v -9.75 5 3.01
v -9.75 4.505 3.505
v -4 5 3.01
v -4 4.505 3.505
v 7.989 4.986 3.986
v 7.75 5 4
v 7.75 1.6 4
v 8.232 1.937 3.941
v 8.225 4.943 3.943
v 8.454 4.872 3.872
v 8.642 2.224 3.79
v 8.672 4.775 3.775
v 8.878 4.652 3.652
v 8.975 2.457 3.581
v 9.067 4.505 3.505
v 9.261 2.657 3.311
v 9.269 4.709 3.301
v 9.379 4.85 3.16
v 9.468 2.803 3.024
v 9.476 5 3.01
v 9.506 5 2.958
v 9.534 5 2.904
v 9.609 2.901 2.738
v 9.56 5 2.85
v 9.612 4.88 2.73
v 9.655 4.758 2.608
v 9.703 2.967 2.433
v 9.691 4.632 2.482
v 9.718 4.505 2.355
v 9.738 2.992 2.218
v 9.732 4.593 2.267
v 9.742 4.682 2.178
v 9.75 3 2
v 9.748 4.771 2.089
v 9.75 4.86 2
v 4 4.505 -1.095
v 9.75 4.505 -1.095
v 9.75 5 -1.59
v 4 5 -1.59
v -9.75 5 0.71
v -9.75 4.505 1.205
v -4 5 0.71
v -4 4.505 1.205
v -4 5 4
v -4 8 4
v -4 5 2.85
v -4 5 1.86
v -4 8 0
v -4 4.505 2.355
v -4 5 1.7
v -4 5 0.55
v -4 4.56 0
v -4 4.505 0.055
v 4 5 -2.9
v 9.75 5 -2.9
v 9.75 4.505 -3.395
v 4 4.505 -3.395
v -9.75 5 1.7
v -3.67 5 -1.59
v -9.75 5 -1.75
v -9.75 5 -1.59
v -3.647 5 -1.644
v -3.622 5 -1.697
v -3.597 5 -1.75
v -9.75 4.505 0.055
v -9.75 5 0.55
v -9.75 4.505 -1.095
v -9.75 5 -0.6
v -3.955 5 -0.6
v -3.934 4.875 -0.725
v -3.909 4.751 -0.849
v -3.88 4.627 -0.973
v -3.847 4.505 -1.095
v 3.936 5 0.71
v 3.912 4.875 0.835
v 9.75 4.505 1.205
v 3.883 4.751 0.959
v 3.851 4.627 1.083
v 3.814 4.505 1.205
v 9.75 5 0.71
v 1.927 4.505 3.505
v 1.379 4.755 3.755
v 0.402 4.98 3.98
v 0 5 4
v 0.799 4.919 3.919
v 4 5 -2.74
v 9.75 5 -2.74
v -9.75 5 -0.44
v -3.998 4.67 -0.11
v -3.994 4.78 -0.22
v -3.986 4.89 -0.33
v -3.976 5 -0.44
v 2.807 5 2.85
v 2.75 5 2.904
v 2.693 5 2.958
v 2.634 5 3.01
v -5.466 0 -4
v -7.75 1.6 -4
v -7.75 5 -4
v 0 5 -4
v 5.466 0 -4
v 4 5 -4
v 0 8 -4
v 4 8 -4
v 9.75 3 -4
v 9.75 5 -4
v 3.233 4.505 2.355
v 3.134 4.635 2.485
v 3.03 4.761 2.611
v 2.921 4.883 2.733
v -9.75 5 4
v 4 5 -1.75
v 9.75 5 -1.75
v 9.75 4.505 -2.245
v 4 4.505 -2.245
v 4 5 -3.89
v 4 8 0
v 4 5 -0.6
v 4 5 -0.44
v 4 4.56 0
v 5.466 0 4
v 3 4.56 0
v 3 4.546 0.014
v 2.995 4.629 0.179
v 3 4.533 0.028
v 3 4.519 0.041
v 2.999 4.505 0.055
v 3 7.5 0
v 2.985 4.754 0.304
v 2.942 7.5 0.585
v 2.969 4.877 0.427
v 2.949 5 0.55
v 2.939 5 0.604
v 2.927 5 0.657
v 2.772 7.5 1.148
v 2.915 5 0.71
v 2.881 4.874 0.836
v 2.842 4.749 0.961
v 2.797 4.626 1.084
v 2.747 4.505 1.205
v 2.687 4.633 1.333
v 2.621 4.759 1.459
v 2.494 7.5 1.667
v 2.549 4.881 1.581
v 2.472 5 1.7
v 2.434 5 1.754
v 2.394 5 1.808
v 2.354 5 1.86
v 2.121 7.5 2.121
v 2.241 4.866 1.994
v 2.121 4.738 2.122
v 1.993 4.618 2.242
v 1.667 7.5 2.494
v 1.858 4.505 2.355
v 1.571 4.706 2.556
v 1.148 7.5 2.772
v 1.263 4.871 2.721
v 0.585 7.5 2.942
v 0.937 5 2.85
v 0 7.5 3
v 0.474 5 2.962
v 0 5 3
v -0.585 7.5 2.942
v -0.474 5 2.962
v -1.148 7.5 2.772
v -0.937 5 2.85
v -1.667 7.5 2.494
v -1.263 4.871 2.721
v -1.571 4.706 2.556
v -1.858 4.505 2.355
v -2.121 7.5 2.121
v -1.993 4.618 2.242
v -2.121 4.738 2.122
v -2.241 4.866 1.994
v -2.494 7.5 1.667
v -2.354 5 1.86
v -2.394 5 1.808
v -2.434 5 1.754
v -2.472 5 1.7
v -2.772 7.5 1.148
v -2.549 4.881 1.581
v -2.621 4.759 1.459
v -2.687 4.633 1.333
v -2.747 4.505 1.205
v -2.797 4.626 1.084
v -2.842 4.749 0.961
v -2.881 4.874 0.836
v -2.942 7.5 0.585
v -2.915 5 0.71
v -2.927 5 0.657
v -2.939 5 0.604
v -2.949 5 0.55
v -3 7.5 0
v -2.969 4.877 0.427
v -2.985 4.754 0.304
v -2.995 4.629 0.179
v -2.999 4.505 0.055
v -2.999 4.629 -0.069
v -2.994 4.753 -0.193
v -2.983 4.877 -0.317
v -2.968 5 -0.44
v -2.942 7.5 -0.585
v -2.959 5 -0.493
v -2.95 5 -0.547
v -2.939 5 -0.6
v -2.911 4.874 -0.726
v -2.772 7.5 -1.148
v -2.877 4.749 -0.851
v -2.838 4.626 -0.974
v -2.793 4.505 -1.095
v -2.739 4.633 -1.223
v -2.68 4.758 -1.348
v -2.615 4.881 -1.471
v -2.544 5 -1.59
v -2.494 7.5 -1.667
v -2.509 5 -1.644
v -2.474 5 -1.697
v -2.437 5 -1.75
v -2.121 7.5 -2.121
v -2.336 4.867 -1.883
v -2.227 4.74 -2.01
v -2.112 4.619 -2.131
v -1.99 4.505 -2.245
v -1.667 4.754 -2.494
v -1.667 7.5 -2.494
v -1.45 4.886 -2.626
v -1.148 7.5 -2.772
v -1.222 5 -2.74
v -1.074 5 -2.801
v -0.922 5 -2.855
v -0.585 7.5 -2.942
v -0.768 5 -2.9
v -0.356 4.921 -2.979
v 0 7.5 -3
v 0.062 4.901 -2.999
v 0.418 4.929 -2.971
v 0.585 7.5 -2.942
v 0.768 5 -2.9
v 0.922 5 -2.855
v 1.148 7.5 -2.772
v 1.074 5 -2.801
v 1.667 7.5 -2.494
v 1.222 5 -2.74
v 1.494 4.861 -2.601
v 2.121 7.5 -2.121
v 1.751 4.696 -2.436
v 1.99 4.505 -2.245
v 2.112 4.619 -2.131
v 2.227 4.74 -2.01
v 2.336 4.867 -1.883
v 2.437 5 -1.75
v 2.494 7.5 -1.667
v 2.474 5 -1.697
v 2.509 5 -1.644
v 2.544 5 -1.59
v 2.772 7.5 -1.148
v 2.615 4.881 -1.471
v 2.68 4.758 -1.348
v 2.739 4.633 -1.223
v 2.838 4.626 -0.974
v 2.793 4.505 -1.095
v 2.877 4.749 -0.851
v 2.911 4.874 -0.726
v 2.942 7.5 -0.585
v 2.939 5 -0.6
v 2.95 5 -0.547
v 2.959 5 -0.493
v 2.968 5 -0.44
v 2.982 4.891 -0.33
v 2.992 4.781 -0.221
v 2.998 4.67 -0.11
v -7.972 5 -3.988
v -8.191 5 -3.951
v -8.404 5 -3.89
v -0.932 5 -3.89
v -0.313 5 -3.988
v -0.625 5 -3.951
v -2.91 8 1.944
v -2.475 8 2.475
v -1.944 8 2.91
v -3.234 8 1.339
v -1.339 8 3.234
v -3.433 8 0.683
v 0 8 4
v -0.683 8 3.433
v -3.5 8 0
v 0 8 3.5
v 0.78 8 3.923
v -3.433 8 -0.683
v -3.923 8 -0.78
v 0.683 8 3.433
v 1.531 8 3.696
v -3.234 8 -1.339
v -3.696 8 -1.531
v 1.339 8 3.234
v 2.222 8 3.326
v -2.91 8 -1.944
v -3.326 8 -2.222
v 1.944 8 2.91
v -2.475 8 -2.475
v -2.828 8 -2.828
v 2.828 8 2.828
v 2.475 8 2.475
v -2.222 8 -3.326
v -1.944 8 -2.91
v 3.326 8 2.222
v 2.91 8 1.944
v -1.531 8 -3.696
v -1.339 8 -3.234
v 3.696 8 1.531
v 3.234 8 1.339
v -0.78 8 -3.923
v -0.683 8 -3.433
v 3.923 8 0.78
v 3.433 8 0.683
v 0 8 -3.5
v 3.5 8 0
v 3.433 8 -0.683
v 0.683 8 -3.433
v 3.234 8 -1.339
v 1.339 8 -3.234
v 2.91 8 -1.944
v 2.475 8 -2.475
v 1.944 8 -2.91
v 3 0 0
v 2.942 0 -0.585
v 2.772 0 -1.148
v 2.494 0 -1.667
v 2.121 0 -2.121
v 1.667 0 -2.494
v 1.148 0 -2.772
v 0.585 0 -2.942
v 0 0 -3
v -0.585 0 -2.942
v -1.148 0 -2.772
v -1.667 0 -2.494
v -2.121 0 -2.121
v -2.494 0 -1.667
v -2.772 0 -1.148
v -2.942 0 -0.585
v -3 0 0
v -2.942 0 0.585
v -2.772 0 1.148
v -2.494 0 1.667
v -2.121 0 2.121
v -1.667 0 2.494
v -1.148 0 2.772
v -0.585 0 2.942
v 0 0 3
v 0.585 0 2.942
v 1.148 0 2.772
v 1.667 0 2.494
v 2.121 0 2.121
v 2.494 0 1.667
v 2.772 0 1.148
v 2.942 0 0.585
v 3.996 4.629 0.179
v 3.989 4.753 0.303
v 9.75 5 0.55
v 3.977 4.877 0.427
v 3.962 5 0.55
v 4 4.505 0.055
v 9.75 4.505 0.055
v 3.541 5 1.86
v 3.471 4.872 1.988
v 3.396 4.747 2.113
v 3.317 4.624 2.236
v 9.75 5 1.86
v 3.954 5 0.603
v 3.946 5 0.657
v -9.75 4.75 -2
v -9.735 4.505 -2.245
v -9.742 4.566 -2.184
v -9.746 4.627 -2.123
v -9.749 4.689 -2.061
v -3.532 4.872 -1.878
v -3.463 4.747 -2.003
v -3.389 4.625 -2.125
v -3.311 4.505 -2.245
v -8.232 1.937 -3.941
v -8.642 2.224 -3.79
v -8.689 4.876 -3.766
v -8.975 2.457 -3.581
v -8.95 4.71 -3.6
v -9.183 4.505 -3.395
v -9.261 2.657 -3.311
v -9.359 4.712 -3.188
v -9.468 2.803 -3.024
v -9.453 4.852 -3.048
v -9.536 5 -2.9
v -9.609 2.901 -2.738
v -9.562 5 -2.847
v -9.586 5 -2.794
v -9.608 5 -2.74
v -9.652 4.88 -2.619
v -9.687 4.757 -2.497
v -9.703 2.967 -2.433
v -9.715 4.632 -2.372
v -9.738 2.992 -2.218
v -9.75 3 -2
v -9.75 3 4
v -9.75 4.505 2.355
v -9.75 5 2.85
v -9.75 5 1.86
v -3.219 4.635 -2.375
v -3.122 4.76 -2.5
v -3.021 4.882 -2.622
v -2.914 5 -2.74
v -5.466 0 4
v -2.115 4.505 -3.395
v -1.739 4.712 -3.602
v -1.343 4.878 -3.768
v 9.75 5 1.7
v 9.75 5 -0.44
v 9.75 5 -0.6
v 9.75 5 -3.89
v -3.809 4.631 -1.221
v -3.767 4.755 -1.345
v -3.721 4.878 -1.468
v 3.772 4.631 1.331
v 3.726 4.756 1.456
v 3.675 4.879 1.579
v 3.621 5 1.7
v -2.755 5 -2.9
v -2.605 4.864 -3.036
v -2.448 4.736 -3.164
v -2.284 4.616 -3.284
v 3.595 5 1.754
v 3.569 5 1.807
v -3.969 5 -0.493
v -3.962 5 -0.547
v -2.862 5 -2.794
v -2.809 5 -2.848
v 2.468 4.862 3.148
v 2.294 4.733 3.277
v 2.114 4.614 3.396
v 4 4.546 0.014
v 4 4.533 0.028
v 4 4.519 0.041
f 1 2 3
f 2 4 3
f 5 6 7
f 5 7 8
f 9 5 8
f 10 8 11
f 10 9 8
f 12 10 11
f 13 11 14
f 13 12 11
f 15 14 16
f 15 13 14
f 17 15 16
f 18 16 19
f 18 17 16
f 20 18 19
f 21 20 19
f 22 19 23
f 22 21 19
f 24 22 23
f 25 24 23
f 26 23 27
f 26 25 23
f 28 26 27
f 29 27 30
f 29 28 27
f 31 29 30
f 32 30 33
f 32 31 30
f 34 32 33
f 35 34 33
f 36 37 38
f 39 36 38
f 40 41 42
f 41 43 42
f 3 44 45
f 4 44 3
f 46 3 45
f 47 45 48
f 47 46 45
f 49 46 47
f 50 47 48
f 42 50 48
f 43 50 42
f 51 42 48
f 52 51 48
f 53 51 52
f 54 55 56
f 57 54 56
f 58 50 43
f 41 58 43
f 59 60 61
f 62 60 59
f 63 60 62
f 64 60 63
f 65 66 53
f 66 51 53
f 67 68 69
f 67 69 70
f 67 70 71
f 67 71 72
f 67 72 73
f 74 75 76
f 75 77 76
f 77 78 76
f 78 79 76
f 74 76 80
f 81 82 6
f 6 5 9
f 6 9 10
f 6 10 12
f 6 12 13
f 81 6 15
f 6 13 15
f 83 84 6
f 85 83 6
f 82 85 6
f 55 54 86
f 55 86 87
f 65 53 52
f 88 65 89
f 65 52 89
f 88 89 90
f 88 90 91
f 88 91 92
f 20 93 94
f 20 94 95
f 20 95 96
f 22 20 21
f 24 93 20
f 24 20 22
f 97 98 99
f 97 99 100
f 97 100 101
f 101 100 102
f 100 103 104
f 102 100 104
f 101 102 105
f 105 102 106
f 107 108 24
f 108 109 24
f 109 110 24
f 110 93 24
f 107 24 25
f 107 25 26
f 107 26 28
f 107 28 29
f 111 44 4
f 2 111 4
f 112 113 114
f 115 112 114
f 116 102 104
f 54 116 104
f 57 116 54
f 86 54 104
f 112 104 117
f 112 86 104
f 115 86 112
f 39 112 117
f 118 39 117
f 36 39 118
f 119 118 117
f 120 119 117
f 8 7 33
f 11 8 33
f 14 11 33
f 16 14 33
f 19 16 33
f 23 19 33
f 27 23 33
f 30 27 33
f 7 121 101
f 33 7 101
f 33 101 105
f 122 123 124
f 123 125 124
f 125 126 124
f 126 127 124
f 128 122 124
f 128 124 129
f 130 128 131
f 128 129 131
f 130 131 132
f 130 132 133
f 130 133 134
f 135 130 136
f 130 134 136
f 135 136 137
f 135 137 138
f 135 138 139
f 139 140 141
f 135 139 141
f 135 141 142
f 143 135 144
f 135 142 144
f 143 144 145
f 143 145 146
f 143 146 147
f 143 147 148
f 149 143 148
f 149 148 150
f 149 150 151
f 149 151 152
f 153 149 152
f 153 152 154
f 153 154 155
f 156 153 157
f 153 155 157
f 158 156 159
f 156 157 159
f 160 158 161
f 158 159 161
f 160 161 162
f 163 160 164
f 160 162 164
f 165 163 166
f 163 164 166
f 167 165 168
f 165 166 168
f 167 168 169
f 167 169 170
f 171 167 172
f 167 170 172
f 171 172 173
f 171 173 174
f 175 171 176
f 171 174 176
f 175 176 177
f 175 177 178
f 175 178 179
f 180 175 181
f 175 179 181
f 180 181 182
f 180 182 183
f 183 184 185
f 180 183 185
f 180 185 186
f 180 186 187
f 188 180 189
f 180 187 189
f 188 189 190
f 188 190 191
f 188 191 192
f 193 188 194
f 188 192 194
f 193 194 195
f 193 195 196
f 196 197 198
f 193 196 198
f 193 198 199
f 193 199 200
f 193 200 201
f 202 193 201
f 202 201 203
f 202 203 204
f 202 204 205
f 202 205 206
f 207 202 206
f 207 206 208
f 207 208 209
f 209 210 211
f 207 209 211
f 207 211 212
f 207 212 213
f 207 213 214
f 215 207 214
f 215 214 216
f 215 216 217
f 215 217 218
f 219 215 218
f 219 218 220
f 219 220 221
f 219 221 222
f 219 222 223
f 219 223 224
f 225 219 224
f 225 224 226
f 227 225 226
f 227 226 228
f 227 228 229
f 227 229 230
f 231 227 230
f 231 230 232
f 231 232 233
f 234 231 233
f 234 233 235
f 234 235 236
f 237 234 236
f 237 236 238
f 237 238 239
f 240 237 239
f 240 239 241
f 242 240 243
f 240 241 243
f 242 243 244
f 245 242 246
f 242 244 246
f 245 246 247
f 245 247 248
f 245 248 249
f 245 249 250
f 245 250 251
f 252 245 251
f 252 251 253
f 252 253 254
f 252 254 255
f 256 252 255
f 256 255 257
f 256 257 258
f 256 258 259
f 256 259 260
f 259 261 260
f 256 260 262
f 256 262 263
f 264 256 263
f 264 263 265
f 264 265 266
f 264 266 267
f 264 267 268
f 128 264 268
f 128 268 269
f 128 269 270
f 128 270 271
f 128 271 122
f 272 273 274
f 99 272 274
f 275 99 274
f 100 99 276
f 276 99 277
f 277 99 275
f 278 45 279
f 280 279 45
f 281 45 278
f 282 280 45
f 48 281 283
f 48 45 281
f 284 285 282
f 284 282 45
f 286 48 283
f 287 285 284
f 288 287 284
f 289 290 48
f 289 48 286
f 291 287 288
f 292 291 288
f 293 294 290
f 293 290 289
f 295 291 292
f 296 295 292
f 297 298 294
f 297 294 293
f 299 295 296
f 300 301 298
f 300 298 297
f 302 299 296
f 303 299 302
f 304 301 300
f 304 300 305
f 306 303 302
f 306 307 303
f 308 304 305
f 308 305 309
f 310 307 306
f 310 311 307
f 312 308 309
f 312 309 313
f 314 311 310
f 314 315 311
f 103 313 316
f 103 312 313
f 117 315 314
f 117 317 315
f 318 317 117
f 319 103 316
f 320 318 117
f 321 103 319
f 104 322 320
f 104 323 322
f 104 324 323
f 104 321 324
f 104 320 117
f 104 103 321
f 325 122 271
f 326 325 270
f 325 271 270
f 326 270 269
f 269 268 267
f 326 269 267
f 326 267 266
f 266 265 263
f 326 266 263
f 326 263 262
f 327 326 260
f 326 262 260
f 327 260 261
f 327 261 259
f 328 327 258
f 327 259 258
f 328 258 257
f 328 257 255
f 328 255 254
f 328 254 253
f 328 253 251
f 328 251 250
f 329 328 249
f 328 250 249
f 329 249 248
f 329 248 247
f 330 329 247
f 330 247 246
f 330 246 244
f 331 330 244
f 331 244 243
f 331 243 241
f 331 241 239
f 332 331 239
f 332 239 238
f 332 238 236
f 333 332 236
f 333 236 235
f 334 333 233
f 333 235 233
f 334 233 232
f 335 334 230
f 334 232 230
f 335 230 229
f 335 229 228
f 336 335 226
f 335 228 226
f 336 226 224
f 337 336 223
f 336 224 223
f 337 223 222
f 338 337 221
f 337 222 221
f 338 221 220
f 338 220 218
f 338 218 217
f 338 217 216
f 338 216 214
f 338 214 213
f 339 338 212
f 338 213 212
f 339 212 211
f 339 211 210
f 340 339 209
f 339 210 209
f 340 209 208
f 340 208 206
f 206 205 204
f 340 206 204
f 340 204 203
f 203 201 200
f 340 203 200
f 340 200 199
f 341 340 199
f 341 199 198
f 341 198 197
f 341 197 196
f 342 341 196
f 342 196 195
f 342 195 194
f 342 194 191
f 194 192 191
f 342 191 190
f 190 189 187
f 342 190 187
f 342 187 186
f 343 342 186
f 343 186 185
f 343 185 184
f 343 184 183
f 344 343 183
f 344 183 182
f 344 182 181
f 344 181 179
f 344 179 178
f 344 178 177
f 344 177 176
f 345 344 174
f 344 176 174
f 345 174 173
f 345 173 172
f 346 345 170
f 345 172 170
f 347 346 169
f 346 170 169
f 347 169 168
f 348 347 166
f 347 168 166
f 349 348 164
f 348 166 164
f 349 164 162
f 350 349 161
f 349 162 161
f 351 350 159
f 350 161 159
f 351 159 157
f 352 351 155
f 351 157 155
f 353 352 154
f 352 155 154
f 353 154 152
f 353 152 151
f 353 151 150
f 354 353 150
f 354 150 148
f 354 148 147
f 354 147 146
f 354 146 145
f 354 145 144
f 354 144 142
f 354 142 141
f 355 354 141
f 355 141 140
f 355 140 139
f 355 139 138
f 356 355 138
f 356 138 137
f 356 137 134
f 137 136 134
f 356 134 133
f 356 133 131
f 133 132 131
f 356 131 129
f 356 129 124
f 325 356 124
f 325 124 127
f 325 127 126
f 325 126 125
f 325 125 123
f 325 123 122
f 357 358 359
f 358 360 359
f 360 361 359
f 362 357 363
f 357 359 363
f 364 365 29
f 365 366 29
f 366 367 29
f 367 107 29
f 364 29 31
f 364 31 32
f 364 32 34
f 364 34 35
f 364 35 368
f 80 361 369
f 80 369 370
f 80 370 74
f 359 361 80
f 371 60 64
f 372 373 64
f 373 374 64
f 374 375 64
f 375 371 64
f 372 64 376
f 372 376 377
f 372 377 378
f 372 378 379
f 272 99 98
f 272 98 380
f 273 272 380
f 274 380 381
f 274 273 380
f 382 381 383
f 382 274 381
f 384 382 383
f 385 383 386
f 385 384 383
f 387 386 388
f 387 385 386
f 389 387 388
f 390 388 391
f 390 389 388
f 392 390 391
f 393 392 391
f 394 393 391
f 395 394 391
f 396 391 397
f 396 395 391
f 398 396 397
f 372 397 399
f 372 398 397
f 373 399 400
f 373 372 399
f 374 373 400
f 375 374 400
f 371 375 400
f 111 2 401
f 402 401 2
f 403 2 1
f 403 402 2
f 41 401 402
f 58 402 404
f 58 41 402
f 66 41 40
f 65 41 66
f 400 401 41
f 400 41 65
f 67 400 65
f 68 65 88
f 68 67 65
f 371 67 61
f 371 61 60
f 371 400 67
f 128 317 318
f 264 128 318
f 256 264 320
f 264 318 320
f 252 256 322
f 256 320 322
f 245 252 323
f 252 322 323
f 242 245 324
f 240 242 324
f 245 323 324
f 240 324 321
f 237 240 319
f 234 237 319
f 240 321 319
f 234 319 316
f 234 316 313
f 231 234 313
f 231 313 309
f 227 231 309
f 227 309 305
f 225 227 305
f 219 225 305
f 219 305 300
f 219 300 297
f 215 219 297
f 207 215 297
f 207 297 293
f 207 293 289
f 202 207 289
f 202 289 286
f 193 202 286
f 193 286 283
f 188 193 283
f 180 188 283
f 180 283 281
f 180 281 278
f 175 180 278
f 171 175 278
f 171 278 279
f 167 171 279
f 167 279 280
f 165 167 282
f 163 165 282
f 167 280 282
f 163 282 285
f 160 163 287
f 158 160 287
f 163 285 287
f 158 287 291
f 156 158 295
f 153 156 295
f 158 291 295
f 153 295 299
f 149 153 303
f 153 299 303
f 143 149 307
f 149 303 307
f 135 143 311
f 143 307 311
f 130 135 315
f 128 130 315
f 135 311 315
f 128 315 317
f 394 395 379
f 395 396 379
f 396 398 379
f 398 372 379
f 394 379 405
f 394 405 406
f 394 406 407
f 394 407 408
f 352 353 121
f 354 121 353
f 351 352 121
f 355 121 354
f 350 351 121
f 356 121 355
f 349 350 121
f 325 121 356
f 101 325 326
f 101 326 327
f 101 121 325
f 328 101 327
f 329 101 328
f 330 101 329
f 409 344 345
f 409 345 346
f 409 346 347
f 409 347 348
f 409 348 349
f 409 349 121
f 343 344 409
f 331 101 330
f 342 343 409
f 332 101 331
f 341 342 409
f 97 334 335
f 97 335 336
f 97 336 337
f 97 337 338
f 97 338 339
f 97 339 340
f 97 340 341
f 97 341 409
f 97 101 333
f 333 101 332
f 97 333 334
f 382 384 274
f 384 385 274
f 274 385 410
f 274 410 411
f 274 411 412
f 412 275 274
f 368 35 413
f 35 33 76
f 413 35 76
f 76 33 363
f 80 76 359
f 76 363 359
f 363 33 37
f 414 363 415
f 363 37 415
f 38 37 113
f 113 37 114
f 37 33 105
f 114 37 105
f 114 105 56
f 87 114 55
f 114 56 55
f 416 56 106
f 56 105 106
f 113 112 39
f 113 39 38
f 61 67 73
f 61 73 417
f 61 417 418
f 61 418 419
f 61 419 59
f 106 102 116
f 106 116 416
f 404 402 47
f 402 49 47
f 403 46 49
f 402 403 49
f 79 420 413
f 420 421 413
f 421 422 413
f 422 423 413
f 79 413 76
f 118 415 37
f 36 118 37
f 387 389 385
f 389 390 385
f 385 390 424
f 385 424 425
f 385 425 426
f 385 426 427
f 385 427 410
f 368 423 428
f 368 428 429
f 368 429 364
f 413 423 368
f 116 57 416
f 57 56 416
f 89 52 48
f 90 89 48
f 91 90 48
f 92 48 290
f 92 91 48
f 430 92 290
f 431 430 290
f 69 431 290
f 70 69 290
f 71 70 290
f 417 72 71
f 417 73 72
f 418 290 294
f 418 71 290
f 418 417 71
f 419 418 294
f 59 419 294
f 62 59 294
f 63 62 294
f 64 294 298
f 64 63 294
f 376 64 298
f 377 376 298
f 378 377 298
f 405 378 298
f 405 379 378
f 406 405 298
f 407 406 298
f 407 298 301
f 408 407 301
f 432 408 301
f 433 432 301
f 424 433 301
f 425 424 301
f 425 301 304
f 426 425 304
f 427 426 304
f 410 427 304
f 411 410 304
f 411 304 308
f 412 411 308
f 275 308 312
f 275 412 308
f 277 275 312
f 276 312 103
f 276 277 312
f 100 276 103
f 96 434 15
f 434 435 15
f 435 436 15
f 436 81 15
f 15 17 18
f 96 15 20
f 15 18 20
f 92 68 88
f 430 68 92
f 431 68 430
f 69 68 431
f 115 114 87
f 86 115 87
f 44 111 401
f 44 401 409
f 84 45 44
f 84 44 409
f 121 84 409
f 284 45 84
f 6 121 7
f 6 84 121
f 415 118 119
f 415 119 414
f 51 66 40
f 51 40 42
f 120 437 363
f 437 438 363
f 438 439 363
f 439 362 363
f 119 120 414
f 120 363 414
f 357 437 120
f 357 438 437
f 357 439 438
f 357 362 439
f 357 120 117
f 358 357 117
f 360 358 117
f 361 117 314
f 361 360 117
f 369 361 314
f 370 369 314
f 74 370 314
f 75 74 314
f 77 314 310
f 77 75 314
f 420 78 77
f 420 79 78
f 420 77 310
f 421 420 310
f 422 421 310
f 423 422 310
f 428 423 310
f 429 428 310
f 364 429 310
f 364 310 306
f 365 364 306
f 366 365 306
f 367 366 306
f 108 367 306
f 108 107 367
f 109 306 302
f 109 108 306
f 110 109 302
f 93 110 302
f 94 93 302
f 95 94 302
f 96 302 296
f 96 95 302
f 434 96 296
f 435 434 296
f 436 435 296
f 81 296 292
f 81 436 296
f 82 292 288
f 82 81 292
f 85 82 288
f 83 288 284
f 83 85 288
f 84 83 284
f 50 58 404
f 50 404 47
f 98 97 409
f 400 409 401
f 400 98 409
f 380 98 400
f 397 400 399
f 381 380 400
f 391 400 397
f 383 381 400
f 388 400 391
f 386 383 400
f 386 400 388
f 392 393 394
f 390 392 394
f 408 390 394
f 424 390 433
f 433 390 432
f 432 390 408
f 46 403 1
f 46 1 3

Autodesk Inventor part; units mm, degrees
ref_plane "YZ Plane" through (0, 0, 0) normal (1, 0, 0) x (0, 1, 0)
ref_plane "XZ Plane" through (0, 0, 0) normal (0, 1, 0) x (-1, 0, 0)
ref_plane "XY Plane" through (0, 0, 0) normal (0, 0, 1) x (1, 0, 0)
sketch "Skizze3" plane through (0, 0, 0) normal (0, 0, 1) x (1, 0, 0)
  line L0 (0, 0) -> (5.4656, 0)
  line L1 (5.4656, 0) -> (9.75, 3)
  line L2 (9.75, 3) -> (9.75, 5)
  line L3 (9.75, 5) -> (0, 5)
  line L4 (0, 6) -> (0, -1) construction
  line L5 (0, 0) -> (-5.4656, 0)
  line L6 (-5.4656, 0) -> (-9.75, 3)
  line L7 (-9.75, 3) -> (-9.75, 5)
  line L8 (-9.75, 5) -> (0, 5)
  dimension "d6" = 9.75
  dimension "d8" = 5
  dimension "d9" = 3
  dimension "d10" = 145
extrude "Extrusion2" add sketch "Skizze3" along normal mid plane 8
sketch "Skizze4" plane through (-9.75, 5, 4) normal (0, 1, 0) x (1, 0, 0)
  line L0 (0, 8) -> (0, 0) projected
  line L1 (19.5, 0) -> (0, 0) projected
  line L2 (19.5, 8) -> (19.5, 0) projected
  line L3 (0, 8) -> (19.5, 8) projected
  circle A0 centre (9.75, 4) radius 3
  line L4 (5.75, 8) -> (13.75, 8)
  line L5 (13.75, 8) -> (13.75, 0)
  line L6 (13.75, 0) -> (5.75, 0)
  line L7 (5.75, 0) -> (5.75, 8)
  line L8 (5.75, 8) -> (13.75, 0) construction
  line L9 (13.75, 8) -> (5.75, 0) construction
  line L10 (0, 8) -> (19.5, 8) projected
  arc A1 (9.75, 8) -> (5.75, 4) centre (9.75, 4) ccw
  arc A2 (9.75, 0) -> (13.75, 4) centre (9.75, 4) ccw
  point P0 (9.75, 0)
  dimension "d13" = 6
  dimension "d14" = 8
  dimension "d15" = 8
extrude "Extrusion3" add sketch "Skizze4" along normal blind 3 and the other way blind 5 separate body contours L7 A1 L3 L5 A2 L1
sketch "Skizze5" plane through (9.75, 3, 4) normal (1, 0, 0) x (0, 0, -1)
  line L0 (8, 2) -> (0, 2) projected
  line L1 (0, 0) -> (0, 2) projected
  line L2 (8, 0) -> (0, 0) projected
  line L3 (8, 2) -> (8, 0) projected
  line L4 (0, 0) -> (0, 2) projected
  line L5 (0, 2) -> (0.495, 1.505)
  line L6 (0.495, 1.505) -> (0.9899, 2)
  line L7 (8, 2) -> (0, 2) projected
  line L8 (1.15, 2) -> (1.645, 1.505)
  line L9 (1.645, 1.505) -> (2.1399, 2)
  line L10 (2.3, 2) -> (2.795, 1.505)
  line L11 (2.795, 1.505) -> (3.2899, 2)
  line L12 (3.45, 2) -> (3.945, 1.505)
  line L13 (3.945, 1.505) -> (4.4399, 2)
  line L14 (4.6, 2) -> (5.095, 1.505)
  line L15 (5.095, 1.505) -> (5.5899, 2)
  line L16 (5.75, 2) -> (6.245, 1.505)
  line L17 (6.245, 1.505) -> (6.7399, 2)
  line L18 (6.9, 2) -> (7.395, 1.505)
  line L19 (7.395, 1.505) -> (7.8899, 2)
  point P0 (4, -3)
  dimension "d21" = 0.7
  dimension "d24" = 1.15
extrude "Extrusion4" cut sketch "Skizze5" against normal up to surface (19.5 mm away) contours L19 L18 L0 | L17 L16 L0 | L0 L6 L5 | L15 L14 L0 | L0 L9 L8 | L13 L12 L0 | L0 L11 L10 bodies 1
extrude "Extrusion5" cut sketch "Skizze4" against normal blind 10 contours A0 bodies 1
chamfer "Fase2" distance 0.5 angle 45 1 edges at (-3, 8, 0)
combine bodies "Kombinieren1" operation type add bodies to combine 1 2
fillet "Rundung1" radius 2 2 edges at (9.75, 4, 4) (-9.75, 4, -4)
properties part number "T-NUT - DropIn 4040 SERIES - M6"
